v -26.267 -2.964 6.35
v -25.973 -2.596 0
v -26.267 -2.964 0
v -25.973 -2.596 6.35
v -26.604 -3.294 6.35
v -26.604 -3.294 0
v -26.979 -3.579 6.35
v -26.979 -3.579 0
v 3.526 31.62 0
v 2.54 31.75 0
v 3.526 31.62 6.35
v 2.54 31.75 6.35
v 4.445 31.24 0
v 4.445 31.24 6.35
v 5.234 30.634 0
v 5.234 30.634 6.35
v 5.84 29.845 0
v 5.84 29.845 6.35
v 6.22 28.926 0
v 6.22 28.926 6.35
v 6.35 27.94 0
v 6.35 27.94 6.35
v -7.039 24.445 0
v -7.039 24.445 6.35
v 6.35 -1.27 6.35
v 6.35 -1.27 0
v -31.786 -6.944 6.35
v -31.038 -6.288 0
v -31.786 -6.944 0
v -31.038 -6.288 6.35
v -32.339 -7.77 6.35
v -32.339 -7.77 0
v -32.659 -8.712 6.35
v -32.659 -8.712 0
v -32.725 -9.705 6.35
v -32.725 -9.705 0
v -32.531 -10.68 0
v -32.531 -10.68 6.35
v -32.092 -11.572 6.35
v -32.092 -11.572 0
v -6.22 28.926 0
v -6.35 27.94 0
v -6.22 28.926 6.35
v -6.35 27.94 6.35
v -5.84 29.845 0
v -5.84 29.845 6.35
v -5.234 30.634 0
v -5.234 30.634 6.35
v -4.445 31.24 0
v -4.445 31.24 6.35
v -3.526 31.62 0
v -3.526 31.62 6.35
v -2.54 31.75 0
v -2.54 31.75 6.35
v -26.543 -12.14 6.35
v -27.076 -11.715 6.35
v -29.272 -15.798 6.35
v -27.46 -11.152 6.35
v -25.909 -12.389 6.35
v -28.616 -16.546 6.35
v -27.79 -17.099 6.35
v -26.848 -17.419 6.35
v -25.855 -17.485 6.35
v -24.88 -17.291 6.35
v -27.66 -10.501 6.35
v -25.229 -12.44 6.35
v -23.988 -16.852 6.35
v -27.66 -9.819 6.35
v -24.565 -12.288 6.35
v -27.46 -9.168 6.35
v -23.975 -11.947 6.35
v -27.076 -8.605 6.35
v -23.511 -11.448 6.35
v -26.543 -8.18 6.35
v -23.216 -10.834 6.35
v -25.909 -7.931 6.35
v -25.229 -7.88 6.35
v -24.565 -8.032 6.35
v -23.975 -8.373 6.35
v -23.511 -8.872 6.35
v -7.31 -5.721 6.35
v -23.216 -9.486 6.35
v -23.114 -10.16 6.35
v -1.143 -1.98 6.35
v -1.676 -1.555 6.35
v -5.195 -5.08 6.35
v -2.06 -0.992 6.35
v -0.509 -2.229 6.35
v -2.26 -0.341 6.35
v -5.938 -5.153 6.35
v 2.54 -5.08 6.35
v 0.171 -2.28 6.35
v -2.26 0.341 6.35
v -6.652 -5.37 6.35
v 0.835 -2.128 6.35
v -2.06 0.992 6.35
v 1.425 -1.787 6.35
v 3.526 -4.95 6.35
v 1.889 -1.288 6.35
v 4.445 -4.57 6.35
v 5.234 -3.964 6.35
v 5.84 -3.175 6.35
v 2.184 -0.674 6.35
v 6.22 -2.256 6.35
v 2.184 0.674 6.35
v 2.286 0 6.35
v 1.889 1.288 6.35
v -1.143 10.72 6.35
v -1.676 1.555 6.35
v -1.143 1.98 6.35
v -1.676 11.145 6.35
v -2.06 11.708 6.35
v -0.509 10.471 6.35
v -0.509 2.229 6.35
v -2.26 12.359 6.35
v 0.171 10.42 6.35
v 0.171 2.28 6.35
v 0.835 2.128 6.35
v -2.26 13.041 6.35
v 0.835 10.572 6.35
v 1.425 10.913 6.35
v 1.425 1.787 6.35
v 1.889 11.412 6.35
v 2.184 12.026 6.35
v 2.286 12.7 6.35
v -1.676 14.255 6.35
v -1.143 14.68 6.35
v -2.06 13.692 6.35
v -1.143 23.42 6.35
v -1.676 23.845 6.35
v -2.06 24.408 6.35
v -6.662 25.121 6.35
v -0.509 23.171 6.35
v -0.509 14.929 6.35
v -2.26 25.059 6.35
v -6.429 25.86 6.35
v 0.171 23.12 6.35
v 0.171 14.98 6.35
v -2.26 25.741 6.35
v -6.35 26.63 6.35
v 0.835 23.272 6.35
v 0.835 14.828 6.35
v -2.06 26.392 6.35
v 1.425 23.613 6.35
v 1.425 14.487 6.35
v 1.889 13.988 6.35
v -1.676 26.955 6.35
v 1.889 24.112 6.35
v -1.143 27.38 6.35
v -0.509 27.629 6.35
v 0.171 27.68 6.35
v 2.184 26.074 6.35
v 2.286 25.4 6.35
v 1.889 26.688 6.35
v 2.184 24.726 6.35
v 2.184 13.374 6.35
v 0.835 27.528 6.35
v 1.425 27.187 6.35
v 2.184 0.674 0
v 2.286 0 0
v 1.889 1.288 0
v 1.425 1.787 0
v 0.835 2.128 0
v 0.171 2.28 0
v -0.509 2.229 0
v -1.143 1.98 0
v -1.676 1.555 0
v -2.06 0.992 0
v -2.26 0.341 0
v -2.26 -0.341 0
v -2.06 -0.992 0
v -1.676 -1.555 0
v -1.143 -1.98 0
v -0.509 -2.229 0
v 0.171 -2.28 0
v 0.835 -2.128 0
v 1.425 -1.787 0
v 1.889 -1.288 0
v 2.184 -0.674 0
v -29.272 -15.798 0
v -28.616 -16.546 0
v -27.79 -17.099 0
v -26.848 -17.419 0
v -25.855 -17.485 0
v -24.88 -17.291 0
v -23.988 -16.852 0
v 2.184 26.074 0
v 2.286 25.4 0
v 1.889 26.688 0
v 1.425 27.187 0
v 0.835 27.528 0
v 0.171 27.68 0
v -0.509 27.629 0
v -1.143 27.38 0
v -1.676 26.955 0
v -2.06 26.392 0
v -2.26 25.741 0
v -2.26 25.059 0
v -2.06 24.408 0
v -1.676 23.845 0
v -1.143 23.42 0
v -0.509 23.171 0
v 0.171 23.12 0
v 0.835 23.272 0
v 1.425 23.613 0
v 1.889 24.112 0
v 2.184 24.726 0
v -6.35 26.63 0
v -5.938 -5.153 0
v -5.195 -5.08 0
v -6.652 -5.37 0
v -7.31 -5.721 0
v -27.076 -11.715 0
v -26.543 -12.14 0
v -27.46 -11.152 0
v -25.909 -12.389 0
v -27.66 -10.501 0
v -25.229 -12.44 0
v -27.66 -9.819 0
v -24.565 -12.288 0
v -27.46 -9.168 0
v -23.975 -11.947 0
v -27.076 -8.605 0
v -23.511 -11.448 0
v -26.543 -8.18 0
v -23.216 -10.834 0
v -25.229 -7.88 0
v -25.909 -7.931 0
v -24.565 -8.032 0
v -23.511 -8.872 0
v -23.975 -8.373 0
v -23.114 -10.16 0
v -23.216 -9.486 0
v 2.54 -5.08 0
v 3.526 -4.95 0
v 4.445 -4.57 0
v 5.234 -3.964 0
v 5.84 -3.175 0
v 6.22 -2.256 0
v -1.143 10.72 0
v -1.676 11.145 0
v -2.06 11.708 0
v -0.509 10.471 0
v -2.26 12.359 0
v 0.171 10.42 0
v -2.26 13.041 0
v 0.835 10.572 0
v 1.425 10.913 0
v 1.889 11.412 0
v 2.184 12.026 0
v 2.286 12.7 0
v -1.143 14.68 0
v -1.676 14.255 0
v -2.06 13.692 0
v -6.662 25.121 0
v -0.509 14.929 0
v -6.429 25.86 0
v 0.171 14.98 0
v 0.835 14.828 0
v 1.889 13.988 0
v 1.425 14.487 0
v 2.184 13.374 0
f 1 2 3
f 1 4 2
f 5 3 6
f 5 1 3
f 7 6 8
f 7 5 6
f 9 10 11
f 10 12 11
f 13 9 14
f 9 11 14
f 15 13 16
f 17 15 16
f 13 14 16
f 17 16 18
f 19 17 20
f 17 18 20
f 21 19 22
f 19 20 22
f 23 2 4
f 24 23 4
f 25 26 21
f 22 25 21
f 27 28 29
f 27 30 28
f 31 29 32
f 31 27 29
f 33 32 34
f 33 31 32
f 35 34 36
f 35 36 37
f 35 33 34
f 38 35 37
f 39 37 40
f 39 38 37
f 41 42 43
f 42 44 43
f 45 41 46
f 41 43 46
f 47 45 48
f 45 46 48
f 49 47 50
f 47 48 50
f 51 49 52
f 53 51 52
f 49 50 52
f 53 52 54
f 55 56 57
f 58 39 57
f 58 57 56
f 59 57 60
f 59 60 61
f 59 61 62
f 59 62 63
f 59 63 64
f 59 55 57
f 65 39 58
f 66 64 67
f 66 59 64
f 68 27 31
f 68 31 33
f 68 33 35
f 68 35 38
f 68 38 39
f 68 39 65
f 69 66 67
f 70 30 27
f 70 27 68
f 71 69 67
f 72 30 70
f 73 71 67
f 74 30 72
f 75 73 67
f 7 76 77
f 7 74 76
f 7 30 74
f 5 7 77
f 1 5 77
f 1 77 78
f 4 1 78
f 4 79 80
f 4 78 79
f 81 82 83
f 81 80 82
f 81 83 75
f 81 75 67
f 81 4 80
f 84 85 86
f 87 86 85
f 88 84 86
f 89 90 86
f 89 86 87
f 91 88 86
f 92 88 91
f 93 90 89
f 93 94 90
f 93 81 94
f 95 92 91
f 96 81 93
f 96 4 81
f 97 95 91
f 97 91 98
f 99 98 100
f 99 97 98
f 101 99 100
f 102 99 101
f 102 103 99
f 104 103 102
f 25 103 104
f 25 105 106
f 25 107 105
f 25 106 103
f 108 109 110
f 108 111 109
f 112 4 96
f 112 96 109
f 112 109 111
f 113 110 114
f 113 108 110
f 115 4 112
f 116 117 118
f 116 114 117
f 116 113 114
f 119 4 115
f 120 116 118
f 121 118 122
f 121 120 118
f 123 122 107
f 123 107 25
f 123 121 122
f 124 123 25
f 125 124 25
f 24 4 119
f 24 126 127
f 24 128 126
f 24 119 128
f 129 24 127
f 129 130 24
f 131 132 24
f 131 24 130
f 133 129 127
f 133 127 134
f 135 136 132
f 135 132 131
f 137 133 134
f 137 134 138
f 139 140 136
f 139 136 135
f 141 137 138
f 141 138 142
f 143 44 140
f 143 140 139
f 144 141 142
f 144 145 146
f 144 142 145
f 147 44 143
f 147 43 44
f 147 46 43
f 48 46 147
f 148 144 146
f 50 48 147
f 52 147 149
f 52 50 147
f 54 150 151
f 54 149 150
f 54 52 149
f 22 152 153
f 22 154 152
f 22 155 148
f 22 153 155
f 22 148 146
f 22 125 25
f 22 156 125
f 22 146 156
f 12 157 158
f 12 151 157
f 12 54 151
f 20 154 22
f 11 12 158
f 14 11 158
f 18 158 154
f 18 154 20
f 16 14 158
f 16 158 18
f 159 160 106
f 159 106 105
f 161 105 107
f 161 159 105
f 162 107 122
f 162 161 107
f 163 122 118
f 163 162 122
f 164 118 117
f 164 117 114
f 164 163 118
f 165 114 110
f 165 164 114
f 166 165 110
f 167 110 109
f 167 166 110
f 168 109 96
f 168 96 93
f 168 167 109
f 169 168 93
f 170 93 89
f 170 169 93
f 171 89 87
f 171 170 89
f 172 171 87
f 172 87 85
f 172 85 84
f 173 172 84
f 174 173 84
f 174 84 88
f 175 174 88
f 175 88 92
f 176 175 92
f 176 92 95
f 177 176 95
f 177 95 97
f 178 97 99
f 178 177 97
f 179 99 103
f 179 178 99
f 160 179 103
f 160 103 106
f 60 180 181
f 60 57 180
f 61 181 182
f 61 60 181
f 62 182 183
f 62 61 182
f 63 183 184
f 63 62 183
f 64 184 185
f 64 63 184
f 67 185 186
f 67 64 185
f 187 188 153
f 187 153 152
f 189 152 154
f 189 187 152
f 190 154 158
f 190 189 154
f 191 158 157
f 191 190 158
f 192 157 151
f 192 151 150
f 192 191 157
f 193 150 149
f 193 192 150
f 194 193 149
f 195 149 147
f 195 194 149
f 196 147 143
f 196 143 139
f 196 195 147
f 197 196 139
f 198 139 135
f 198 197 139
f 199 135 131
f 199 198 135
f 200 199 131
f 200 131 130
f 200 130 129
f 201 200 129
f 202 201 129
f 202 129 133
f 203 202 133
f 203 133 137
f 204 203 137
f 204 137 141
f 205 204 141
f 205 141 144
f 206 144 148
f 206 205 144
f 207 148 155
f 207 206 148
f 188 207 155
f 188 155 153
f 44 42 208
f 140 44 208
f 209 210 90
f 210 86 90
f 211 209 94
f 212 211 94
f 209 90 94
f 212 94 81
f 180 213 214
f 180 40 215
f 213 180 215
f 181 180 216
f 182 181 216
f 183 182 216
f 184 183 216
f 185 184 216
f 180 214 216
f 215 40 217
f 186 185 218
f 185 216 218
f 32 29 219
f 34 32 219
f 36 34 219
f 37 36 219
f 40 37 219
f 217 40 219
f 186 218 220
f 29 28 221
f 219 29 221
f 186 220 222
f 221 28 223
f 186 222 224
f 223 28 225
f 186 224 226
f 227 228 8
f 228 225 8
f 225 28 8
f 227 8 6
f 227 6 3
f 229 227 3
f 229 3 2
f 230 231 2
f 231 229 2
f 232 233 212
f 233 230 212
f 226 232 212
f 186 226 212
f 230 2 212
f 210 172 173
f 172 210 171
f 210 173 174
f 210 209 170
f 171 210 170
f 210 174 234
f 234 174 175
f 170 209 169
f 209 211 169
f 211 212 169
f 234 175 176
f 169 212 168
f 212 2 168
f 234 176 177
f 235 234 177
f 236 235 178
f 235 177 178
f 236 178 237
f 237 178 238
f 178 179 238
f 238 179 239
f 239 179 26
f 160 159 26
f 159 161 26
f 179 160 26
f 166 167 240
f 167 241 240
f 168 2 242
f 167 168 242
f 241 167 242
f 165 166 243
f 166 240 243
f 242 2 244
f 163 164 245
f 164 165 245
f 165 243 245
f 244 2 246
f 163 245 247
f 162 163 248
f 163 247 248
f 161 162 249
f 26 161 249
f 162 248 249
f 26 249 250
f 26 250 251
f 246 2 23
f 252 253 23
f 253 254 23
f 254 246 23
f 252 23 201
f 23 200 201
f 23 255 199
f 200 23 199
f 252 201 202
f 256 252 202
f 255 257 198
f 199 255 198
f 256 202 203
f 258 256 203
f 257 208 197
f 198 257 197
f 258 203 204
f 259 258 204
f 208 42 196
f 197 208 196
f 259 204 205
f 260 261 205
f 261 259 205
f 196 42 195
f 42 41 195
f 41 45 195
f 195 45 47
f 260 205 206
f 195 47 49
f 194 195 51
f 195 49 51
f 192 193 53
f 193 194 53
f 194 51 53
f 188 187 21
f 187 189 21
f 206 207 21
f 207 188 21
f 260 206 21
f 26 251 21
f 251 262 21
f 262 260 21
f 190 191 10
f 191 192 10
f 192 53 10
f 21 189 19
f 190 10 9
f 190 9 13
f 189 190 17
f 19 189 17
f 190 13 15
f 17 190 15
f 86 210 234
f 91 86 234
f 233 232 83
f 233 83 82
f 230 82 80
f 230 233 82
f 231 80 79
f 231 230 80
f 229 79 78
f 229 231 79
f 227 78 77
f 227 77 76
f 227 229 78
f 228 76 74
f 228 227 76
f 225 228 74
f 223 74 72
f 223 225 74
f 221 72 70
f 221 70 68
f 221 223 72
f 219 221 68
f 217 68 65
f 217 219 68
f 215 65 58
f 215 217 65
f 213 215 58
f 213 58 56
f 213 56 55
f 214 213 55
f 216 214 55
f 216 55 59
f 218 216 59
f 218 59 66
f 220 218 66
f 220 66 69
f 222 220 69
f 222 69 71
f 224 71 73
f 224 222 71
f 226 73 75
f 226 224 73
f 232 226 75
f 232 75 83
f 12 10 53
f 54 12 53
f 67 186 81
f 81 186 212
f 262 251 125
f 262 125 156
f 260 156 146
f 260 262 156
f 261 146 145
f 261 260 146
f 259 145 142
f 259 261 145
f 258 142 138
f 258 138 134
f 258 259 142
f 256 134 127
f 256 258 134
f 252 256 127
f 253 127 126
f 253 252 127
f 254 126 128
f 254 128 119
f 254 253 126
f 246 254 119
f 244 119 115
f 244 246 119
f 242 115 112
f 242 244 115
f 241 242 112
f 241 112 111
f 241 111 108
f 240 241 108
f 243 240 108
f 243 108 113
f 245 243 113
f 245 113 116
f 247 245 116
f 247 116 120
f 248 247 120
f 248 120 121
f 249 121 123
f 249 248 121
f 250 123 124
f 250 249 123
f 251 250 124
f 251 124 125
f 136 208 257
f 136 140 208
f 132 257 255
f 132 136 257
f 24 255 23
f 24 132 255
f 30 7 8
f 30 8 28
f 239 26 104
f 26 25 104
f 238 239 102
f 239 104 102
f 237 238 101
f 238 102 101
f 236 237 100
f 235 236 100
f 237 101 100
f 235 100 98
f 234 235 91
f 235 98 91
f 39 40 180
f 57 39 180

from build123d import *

# Parameters (mm, degrees)
SKETCH1_R           = 2.286
BOSS_EXTRUDE1_DEPTH = 6.35
CHAMFER1_SIZE       = 15.24
CHAMFER1_SIZE2      = 24.085722971
FILLET1_R           = 3.81


with BuildPart() as part:
    # Sketch1 → Boss-Extrude1 (new body)
    with BuildSketch(Plane.XY):
        Polygon((-6.35, 31.75), (-6.35, 10.18883388), (-34.206786825, -8.403439207), (-27.156560793, -18.966786825), (-6.35, -5.08), (6.35, -5.08), (6.35, 31.75), align=None)
        Circle(SKETCH1_R, mode=Mode.SUBTRACT)
        with Locations((0, 25.4)):
            Circle(SKETCH1_R, mode=Mode.SUBTRACT)
        with Locations((-25.4, -10.16)):
            Circle(SKETCH1_R, mode=Mode.SUBTRACT)
        with Locations((0, 12.7)):
            Circle(SKETCH1_R, mode=Mode.SUBTRACT)
    extrude(amount=BOSS_EXTRUDE1_DEPTH)

    # Chamfer1
    chamfer1_edges = [part.edges().sort_by_distance(p)[0] for p in [
        (-6.35, 10.18883388, 3.175),
    ]]
    chamfer1_side = [part.faces().sort_by_distance(p)[0] for p in [
        (-6.35, 20.96941694, 3.175),
    ]]
    chamfer(chamfer1_edges, length=CHAMFER1_SIZE, length2=CHAMFER1_SIZE2, reference=chamfer1_side[0])

    # Fillet1
    fillet1_edges = [part.edges().sort_by_distance(p)[0] for p in [
        (6.35, 31.75, 3.175),
        (6.35, -5.08, 3.175),
        (-6.35, -5.08, 3.175),
        (-27.156560793, -18.966786825, 3.175),
        (-34.206786825, -8.403439207, 3.175),
        (-6.35, 31.75, 3.175),
        (-26.383532628, -3.182015811, 3.175),
        (-6.35, 25.42883388, 3.175),
    ]]
    fillet(fillet1_edges, radius=FILLET1_R)


solid = part.part
